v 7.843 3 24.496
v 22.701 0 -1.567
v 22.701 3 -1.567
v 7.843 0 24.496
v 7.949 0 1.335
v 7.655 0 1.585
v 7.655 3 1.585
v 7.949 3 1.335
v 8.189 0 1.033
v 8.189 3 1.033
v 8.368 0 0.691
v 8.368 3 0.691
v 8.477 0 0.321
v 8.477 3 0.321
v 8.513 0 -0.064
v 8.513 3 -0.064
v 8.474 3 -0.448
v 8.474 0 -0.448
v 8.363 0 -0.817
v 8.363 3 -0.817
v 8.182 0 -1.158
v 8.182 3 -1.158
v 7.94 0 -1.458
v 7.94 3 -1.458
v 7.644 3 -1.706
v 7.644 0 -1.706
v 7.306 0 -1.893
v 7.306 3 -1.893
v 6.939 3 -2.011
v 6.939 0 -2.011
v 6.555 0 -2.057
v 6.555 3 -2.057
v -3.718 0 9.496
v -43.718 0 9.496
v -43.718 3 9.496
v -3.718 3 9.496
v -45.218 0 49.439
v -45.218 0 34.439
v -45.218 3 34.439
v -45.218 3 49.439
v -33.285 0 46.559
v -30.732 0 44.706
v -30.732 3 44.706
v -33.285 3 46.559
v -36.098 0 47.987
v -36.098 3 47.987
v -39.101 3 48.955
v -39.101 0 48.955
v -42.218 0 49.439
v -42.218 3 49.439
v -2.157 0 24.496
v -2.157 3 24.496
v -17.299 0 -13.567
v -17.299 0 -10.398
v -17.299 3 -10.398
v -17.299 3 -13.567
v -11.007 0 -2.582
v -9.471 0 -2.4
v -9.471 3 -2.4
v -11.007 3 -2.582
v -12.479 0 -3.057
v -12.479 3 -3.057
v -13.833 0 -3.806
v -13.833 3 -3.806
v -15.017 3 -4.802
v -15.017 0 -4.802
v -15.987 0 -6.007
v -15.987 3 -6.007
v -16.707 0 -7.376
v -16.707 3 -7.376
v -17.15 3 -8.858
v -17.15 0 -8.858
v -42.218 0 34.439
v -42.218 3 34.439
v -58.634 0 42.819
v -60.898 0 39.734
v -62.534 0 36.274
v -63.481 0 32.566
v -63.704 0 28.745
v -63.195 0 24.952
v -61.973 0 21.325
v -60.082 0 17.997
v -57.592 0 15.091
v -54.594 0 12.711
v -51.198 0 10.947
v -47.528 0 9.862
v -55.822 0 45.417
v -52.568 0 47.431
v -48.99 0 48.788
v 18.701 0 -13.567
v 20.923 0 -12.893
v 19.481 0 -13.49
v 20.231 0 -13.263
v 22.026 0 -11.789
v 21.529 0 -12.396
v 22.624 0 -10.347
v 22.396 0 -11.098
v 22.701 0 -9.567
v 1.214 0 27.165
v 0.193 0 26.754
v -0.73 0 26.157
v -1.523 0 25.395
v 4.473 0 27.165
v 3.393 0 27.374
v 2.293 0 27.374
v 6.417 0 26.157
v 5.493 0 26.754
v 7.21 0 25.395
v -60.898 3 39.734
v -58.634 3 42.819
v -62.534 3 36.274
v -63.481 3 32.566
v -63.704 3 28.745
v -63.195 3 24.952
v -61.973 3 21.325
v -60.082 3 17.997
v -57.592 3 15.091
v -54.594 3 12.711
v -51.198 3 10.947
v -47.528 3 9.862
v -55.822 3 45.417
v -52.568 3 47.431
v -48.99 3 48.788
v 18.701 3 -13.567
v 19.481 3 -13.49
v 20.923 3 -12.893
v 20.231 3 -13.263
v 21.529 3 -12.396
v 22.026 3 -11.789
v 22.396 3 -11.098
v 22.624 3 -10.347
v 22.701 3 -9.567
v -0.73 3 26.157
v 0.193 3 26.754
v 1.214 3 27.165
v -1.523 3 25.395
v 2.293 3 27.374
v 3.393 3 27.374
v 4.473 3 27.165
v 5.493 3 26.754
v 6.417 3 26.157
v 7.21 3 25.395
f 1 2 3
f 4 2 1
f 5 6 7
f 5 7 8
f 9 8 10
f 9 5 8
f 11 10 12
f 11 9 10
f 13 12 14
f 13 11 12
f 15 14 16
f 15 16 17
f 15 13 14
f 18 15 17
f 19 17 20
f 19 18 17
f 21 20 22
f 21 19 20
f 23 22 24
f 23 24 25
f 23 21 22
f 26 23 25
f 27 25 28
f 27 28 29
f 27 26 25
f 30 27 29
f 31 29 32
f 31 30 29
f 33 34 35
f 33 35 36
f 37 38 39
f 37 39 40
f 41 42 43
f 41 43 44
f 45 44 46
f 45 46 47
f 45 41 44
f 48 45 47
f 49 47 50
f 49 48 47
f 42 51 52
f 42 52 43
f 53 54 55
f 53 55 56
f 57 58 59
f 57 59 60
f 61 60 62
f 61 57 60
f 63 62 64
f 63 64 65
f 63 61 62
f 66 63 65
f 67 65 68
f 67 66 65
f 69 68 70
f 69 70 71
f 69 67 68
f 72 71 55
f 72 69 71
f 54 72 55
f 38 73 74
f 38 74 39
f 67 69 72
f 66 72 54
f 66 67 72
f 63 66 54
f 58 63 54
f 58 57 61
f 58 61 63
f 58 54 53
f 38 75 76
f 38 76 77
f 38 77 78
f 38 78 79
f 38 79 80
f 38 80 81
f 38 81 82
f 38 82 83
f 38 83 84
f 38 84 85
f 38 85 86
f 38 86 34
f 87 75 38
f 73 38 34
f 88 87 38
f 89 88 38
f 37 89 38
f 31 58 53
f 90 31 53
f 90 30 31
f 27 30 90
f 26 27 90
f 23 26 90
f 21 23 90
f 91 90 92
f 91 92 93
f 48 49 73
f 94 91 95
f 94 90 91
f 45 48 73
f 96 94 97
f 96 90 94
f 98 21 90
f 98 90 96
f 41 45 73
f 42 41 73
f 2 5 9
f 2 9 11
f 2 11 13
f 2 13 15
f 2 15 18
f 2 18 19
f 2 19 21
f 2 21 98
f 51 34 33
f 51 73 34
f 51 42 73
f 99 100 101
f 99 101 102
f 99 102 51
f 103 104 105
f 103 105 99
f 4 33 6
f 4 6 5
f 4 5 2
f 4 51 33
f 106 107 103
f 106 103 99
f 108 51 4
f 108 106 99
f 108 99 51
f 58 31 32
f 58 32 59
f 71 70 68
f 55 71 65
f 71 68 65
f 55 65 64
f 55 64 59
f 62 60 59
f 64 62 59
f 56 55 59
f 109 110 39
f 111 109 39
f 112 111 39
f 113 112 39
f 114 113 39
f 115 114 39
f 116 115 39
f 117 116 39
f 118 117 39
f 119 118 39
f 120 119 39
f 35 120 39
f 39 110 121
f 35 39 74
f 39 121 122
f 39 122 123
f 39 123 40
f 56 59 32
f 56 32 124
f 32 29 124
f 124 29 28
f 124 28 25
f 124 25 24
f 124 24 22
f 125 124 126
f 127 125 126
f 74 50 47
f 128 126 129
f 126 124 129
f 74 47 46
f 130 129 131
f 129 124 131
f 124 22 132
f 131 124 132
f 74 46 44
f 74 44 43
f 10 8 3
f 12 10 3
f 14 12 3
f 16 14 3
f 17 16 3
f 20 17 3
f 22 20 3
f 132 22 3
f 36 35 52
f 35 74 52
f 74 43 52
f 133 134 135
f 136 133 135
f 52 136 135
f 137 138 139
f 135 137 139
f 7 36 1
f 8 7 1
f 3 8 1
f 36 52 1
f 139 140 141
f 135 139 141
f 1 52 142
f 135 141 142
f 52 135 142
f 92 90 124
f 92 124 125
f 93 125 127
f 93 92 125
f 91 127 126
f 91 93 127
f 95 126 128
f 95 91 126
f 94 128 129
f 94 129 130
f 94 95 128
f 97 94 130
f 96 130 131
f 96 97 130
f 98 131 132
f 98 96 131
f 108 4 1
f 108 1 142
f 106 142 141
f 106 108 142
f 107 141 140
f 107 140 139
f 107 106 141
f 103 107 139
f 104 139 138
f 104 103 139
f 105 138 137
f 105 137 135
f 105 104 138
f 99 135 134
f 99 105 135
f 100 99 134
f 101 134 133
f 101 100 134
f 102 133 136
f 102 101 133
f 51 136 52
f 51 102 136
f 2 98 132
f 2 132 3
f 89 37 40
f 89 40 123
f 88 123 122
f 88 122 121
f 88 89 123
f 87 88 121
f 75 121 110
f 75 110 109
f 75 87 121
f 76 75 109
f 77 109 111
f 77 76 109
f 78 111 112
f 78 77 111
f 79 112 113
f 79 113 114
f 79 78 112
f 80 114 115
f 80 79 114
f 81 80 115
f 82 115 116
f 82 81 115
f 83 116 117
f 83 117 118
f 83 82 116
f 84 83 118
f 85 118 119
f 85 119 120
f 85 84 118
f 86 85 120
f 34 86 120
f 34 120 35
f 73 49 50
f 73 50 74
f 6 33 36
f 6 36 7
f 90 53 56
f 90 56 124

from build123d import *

# Parameters (mm, degrees)
F1_DEPTH = 3


with BuildPart() as f1:
    # F0 (on Front) → F1 (new body)
    with BuildSketch(Plane.XZ):
        with BuildLine():
            Line((-45.218005, 34.439229), (-45.218005, 49.439229))
            ThreePointArc((-45.218005, 49.439229), (-63.703917, 28.74503), (-43.718005, 9.495558))
            Line((-43.718005, 9.495558), (-3.718005, 9.495558))
            Line((-3.718005, 9.495558), (7.654663, 1.584798))
            ThreePointArc((7.654663, 1.584798), (8.427256, -0.635059), (6.55539, -2.0566))
            Line((6.55539, -2.0566), (-9.47062, -2.399568))
            ThreePointArc((-9.47062, -2.399568), (-15.016504, -4.801726), (-17.299454, -10.397736))
            Line((-17.299454, -10.397736), (-17.299454, -13.56711))
            Line((-17.299454, -13.56711), (18.700546, -13.56711))
            ThreePointArc((18.700546, -13.56711), (21.528974, -12.395537), (22.700546, -9.56711))
            Line((22.700546, -9.56711), (22.700546, -1.56711))
            Line((22.700546, -1.56711), (7.843316, 24.495558))
            ThreePointArc((7.843316, 24.495558), (2.843316, 27.400627), (-2.156684, 24.495558))
            Line((-2.156684, 24.495558), (-30.731795, 44.706027))
            ThreePointArc((-30.731795, 44.706027), (-36.098072, 47.987087), (-42.218005, 49.439229))
            Line((-42.218005, 49.439229), (-42.218005, 34.439229))
            Line((-42.218005, 34.439229), (-45.218005, 34.439229))
        make_face()
    extrude(amount=-F1_DEPTH)


solid = f1.part
